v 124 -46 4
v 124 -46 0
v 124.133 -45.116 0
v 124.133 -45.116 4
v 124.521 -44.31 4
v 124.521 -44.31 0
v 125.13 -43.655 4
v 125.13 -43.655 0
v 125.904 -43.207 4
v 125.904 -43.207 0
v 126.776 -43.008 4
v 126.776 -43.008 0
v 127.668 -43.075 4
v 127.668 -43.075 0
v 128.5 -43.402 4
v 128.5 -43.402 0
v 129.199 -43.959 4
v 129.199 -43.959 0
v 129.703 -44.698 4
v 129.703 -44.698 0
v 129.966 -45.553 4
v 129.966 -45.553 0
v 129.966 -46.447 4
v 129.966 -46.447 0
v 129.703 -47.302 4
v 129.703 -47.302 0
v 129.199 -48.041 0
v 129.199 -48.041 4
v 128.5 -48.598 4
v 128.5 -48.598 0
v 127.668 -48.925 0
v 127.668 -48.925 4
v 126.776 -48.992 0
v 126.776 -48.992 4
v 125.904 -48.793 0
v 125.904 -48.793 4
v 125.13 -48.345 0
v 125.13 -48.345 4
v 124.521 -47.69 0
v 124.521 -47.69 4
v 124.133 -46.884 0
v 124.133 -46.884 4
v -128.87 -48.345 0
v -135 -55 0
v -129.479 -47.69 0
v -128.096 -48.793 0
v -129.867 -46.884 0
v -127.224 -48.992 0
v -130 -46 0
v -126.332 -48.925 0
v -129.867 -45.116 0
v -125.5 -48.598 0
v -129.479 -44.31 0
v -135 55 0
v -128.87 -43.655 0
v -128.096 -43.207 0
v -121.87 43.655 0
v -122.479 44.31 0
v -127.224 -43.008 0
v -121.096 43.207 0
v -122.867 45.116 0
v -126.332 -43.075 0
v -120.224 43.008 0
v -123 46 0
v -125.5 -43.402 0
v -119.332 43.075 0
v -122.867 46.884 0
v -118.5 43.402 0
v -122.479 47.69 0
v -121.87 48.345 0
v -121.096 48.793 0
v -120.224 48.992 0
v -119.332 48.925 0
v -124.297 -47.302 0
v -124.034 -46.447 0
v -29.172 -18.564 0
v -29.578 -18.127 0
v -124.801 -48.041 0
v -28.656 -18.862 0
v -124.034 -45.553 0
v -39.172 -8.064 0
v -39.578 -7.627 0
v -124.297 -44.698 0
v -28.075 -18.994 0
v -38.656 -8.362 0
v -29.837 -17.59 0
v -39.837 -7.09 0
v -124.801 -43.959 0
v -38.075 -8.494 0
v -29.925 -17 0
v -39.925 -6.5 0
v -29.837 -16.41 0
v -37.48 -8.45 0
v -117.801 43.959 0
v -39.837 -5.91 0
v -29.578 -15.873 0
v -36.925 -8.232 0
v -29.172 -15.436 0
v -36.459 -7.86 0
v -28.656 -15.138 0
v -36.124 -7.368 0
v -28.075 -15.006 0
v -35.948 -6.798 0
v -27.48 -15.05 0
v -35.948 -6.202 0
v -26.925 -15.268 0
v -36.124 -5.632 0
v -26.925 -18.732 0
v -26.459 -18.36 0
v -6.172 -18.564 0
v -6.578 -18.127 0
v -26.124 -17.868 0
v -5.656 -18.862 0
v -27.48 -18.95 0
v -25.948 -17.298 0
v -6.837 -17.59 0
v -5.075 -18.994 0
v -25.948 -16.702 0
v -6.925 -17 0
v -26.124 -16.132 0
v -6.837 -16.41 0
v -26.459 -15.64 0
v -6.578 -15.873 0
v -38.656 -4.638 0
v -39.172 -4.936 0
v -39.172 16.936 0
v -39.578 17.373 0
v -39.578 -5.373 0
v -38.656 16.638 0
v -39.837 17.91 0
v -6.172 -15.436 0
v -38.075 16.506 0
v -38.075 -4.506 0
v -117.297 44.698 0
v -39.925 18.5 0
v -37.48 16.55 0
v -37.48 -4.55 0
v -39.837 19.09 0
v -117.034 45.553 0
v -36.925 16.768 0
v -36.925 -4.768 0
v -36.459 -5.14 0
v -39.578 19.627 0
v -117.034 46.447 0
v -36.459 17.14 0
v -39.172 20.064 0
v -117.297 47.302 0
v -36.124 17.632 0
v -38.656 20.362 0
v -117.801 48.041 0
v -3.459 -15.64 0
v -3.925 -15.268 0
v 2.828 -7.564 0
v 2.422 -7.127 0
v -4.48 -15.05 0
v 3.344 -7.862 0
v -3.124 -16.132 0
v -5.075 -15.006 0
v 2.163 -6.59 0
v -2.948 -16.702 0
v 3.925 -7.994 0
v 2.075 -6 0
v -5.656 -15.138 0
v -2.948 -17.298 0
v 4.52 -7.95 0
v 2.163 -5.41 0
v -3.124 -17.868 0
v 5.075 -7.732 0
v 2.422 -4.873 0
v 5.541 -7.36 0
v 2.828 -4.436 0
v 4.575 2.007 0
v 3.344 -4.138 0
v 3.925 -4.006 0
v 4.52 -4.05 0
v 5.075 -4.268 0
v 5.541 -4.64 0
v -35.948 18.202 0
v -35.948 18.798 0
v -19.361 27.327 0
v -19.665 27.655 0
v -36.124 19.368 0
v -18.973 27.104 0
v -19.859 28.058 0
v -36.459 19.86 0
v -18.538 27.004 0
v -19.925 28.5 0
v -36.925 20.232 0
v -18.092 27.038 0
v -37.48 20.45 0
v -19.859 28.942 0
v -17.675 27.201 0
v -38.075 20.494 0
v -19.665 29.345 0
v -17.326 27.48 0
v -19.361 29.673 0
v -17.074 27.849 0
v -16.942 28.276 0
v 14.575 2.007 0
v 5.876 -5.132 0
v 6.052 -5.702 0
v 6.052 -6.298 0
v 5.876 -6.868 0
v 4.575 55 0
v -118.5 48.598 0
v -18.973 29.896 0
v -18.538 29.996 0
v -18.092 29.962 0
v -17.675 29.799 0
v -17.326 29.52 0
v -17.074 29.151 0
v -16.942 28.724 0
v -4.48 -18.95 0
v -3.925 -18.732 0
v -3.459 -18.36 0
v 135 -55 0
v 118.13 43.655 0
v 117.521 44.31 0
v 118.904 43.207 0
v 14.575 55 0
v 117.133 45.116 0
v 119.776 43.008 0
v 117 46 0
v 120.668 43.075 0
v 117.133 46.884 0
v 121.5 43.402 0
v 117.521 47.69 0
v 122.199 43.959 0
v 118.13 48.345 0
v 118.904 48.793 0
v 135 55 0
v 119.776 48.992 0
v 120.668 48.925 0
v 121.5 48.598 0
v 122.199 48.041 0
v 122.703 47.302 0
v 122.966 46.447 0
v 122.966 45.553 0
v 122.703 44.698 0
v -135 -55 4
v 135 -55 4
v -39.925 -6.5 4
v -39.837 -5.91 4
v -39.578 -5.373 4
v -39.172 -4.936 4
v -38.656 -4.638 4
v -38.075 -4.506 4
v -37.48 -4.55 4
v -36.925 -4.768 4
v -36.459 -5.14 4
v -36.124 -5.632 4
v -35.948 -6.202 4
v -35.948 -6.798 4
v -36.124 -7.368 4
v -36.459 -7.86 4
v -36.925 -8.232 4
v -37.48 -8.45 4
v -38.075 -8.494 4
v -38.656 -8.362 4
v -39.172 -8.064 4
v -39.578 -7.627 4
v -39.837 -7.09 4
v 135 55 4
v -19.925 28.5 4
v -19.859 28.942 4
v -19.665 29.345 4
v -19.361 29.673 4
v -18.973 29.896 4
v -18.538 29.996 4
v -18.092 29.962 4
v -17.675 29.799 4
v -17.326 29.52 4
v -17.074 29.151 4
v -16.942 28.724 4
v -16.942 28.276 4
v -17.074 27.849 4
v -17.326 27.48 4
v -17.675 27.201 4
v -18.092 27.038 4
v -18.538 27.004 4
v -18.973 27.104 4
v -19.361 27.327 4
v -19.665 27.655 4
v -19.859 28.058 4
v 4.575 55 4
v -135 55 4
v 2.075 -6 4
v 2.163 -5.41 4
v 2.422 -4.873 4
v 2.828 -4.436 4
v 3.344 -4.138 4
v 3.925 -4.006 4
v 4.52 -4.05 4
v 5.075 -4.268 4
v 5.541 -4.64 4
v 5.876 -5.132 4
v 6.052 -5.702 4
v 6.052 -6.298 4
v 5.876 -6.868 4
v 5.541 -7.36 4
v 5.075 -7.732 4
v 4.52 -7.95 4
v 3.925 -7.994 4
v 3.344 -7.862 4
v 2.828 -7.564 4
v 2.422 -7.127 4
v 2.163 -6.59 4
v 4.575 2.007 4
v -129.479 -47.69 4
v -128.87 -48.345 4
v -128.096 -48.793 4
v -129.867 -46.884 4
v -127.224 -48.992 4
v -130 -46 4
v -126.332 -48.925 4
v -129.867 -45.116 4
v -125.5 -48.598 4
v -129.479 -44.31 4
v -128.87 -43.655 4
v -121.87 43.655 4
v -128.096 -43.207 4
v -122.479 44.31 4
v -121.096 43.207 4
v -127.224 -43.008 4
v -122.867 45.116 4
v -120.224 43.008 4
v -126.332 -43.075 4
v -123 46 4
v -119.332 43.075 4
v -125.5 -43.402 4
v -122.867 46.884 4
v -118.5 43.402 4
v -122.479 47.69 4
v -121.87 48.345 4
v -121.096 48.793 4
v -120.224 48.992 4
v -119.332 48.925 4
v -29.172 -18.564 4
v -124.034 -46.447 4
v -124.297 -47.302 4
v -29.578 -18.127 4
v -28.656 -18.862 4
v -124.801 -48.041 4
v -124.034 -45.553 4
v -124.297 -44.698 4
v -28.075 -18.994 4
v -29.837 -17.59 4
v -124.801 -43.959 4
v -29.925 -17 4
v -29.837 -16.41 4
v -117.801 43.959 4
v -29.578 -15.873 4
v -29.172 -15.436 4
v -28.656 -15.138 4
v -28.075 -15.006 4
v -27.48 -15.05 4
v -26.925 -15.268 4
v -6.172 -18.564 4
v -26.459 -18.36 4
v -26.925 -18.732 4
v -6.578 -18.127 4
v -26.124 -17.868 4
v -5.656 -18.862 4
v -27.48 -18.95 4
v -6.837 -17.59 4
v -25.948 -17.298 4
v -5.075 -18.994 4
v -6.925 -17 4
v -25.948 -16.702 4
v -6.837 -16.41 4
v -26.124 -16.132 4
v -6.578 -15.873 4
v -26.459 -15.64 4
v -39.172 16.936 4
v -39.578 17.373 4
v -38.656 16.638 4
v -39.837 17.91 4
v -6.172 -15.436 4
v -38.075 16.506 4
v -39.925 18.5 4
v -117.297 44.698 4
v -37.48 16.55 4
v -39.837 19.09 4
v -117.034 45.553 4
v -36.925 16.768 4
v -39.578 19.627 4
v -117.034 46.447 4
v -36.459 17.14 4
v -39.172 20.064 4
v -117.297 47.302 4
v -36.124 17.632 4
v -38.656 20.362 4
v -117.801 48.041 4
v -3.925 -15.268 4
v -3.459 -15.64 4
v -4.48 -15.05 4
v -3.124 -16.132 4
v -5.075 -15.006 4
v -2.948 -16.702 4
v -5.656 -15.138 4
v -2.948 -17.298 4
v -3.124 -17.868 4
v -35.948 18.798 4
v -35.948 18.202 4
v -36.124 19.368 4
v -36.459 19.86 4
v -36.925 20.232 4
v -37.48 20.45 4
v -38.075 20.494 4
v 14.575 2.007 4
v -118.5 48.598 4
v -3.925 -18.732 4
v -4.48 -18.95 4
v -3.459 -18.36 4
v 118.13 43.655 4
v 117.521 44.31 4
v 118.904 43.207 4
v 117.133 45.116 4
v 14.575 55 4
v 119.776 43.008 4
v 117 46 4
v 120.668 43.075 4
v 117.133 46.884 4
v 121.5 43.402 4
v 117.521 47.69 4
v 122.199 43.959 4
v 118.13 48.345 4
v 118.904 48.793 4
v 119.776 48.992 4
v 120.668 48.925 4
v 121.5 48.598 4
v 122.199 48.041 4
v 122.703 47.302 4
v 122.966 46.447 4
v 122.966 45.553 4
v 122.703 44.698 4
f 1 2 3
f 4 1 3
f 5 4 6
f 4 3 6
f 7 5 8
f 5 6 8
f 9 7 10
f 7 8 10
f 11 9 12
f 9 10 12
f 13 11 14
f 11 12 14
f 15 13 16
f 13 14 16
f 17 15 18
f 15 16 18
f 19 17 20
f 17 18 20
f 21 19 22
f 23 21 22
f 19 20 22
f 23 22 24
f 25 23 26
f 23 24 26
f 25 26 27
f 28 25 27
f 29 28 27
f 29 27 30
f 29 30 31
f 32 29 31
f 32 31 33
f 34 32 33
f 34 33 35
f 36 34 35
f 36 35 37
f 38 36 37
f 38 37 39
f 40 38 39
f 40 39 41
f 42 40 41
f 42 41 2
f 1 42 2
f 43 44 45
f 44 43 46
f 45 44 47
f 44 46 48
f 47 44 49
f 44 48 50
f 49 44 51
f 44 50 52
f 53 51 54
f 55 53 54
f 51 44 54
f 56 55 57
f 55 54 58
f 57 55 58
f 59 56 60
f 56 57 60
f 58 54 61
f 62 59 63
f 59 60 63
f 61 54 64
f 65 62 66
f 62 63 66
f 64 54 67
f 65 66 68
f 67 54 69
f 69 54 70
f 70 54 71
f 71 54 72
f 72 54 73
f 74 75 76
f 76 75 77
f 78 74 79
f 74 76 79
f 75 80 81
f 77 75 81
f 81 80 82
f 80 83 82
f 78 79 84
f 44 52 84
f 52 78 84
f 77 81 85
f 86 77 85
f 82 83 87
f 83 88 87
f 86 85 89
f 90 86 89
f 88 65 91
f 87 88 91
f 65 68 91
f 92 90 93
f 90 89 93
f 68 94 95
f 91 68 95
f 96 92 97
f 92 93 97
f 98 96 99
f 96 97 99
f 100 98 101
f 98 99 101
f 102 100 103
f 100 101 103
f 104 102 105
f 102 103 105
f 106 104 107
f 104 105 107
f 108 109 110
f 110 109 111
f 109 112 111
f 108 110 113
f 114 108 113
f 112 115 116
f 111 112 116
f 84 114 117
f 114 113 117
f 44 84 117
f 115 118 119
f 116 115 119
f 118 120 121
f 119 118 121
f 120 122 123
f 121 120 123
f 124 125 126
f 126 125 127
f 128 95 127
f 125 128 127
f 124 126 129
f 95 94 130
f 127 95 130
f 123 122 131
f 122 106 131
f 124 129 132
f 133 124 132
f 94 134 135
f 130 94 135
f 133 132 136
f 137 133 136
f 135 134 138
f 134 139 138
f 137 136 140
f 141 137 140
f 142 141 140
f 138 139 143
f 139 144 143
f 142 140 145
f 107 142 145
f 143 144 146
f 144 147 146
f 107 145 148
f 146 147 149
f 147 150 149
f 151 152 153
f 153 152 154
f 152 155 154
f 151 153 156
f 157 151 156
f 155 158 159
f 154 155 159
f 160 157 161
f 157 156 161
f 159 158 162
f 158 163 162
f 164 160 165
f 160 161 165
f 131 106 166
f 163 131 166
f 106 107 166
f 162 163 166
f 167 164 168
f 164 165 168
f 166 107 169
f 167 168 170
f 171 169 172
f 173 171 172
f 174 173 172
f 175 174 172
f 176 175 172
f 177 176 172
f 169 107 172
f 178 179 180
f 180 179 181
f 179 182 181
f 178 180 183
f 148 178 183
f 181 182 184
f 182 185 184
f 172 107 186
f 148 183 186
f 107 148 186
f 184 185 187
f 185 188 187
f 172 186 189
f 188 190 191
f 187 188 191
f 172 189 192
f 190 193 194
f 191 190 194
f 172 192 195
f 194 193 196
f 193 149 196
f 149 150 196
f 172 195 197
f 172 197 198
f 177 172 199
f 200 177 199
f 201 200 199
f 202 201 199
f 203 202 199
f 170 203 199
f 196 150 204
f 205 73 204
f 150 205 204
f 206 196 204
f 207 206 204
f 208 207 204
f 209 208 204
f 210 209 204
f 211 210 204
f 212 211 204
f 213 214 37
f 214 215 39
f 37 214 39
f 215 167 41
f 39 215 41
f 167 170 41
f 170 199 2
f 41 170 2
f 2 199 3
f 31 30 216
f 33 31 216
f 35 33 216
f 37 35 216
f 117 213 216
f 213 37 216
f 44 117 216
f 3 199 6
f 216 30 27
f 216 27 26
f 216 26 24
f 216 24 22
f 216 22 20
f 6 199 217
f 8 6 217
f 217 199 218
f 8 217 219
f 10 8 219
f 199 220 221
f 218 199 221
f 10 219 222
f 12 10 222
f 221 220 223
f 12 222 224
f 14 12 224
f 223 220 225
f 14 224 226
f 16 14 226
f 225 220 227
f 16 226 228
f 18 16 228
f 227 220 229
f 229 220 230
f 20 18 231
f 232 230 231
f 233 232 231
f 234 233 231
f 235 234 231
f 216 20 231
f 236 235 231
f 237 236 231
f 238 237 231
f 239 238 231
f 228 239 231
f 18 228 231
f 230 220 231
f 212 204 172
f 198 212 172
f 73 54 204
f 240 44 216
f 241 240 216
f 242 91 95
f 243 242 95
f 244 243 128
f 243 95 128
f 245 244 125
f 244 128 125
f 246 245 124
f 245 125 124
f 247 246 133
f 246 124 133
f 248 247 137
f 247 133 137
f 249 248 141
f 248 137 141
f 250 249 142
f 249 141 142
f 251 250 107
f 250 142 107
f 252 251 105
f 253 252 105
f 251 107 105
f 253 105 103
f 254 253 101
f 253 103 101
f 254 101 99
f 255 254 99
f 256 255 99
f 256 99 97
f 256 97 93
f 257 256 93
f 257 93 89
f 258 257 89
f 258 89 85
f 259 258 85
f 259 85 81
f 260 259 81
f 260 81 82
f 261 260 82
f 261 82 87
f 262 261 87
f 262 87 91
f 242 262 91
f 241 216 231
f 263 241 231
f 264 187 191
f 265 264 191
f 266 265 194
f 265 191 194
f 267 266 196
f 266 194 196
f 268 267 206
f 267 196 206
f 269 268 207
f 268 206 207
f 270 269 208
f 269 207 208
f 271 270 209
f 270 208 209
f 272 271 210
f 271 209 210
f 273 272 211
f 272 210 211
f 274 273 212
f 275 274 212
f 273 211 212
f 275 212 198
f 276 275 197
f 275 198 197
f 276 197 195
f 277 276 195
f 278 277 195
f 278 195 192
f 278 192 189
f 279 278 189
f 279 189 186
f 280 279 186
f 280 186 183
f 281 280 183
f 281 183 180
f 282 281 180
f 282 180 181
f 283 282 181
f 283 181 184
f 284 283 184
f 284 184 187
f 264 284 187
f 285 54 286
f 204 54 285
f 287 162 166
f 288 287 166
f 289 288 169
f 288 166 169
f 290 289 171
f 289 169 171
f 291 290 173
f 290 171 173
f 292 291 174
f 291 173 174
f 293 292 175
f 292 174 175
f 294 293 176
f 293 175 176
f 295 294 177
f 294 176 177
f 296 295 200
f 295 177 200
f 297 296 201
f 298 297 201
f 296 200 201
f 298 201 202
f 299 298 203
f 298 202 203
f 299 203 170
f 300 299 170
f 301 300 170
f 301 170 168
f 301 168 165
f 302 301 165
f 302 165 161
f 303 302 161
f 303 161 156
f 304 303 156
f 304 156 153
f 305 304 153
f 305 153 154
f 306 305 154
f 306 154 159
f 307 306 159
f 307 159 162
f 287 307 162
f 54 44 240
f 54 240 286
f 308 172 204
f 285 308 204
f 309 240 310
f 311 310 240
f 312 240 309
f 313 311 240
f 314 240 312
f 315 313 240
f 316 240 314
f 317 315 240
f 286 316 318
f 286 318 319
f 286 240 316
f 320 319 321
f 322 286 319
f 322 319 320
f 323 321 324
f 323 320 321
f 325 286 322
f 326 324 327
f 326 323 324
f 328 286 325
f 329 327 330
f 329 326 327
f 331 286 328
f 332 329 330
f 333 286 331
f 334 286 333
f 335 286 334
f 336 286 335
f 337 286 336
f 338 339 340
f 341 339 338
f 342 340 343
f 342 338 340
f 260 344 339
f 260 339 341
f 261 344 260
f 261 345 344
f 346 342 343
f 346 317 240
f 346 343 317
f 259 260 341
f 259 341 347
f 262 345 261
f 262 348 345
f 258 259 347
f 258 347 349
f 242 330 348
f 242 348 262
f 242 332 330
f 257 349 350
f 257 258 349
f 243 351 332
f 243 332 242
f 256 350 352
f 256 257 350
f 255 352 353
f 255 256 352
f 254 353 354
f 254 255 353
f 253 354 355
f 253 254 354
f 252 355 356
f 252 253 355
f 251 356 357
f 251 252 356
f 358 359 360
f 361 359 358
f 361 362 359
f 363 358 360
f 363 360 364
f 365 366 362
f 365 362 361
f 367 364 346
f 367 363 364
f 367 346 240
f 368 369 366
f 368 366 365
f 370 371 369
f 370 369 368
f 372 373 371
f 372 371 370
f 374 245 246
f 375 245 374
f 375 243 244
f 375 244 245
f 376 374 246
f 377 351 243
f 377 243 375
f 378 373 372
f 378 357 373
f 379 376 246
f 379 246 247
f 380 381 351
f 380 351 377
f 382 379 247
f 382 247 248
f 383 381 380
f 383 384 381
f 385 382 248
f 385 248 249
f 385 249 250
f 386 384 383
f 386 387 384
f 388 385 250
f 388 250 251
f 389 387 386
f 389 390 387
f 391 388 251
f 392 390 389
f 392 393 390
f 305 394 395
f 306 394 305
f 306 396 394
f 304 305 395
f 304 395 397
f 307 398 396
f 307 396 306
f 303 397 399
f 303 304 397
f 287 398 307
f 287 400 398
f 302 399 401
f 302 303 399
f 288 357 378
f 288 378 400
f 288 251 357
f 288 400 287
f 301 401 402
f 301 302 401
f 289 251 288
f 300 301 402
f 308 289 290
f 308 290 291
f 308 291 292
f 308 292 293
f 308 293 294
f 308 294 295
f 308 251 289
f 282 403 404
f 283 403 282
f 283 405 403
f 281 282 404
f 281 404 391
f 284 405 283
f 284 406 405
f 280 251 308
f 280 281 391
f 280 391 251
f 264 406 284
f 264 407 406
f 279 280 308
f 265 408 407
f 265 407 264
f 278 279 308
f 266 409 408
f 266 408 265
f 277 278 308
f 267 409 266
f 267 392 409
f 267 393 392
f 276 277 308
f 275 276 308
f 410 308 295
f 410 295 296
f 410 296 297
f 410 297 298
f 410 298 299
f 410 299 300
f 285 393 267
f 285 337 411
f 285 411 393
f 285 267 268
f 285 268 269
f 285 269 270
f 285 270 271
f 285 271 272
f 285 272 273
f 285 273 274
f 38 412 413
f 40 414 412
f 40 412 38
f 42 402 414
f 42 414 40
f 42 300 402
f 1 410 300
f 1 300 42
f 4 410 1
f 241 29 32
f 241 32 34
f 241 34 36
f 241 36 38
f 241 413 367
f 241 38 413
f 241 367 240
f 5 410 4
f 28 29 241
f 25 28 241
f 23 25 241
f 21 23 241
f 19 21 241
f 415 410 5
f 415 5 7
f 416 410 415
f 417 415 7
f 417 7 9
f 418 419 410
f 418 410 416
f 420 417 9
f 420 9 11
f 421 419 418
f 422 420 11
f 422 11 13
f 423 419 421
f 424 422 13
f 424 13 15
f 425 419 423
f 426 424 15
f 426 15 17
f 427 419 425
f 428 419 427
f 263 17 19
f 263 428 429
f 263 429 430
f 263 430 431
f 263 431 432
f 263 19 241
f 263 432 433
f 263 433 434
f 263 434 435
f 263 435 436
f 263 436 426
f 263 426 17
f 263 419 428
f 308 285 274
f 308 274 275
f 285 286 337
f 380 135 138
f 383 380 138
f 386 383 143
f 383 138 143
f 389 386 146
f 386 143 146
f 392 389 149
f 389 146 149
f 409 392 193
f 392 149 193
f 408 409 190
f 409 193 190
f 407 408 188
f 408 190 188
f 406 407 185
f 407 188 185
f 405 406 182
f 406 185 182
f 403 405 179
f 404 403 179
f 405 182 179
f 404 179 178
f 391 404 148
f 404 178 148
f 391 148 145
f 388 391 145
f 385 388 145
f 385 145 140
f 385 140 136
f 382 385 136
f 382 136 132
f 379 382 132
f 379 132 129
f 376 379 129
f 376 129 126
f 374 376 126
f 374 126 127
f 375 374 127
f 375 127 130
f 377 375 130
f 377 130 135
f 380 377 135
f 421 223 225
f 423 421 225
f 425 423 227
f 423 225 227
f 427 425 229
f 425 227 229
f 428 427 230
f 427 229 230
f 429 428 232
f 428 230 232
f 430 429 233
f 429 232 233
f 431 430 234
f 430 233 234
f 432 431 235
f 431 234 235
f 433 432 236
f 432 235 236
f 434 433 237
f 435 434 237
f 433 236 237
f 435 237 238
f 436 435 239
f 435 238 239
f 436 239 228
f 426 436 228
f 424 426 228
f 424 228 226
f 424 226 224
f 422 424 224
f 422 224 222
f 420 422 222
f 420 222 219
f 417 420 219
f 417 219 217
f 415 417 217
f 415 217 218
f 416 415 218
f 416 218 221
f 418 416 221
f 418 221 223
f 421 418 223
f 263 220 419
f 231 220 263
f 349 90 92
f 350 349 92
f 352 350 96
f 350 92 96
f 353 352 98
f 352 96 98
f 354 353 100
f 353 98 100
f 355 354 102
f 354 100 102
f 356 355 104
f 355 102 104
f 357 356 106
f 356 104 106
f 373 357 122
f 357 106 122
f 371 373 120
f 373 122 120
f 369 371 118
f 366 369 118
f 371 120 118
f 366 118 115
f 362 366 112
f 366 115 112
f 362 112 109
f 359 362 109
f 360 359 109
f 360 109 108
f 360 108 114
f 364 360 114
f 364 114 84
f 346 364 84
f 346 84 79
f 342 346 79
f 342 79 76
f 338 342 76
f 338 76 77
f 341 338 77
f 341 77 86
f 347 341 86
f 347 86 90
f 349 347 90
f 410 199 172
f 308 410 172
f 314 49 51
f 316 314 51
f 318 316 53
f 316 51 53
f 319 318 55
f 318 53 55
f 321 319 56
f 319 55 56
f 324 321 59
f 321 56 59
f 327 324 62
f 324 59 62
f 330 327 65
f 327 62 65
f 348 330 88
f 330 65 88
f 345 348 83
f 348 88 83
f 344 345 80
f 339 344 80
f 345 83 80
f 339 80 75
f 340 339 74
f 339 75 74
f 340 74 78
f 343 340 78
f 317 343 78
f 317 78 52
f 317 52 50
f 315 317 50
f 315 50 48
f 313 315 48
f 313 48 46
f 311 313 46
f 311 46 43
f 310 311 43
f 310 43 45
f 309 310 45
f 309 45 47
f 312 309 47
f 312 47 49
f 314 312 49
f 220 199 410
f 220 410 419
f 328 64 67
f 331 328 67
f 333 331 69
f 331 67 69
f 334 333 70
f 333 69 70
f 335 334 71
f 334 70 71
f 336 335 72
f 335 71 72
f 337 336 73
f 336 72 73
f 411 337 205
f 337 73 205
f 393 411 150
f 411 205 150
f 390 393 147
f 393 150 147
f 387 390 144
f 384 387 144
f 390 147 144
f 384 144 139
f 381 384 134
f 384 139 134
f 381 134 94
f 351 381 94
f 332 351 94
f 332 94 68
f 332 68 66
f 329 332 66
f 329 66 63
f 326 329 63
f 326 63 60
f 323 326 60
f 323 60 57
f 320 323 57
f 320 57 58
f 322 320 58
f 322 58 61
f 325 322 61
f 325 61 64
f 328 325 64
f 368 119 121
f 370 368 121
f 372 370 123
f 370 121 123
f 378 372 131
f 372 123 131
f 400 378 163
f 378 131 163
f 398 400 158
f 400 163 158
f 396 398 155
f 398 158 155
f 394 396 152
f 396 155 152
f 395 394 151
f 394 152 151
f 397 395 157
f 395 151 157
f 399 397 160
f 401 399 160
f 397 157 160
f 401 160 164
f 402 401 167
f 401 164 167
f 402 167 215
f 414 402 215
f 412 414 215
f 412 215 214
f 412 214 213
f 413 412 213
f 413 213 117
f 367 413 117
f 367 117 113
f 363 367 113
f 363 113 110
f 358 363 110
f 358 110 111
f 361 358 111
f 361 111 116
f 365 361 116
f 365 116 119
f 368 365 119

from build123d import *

# Parameters (mm, degrees)
SKETCH1_W           = 270
SKETCH1_H           = 110
BOSS_EXTRUDE1_DEPTH = 4
SKETCH9_R           = 3
SKETCH9_R_2         = 2
SKETCH9_R_3         = 1.5
SKETCH9_W           = 10
SKETCH9_H           = 52.992911327
CUT_EXTRUDE1_DEPTH  = 146.828666592


with BuildPart() as part:
    # Sketch1 → Boss-Extrude1 (new body)
    with BuildSketch(Plane.XY):
        Rectangle(SKETCH1_W, SKETCH1_H)
    extrude(amount=BOSS_EXTRUDE1_DEPTH)

    # Sketch9 → Cut-Extrude1 (cut, through all)
    with BuildSketch(Plane(origin=(0, 0, 0), x_dir=(-1, 0, 0), z_dir=(0, 0, -1))):
        with Locations((-120, 46)):
            Circle(SKETCH9_R)
        with Locations((-127, -46)):
            Circle(SKETCH9_R)
        with Locations((120, 46)):
            Circle(SKETCH9_R)
        with Locations((127, -46)):
            Circle(SKETCH9_R)
        with Locations((-4.074540436, -6)):
            Circle(SKETCH9_R_2)
        with Locations((4.925459564, -17)):
            Circle(SKETCH9_R_2)
        with Locations((27.925459564, -17)):
            Circle(SKETCH9_R_2)
        with Locations((37.925459564, -6.5)):
            Circle(SKETCH9_R_2)
        with Locations((37.925459564, 18.5)):
            Circle(SKETCH9_R_2)
        with Locations((18.425459564, 28.5)):
            Circle(SKETCH9_R_3)
        with Locations((-9.574540436, 28.503544336)):
            Rectangle(SKETCH9_W, SKETCH9_H)
    extrude(amount=-CUT_EXTRUDE1_DEPTH, mode=Mode.SUBTRACT)


solid = part.part
